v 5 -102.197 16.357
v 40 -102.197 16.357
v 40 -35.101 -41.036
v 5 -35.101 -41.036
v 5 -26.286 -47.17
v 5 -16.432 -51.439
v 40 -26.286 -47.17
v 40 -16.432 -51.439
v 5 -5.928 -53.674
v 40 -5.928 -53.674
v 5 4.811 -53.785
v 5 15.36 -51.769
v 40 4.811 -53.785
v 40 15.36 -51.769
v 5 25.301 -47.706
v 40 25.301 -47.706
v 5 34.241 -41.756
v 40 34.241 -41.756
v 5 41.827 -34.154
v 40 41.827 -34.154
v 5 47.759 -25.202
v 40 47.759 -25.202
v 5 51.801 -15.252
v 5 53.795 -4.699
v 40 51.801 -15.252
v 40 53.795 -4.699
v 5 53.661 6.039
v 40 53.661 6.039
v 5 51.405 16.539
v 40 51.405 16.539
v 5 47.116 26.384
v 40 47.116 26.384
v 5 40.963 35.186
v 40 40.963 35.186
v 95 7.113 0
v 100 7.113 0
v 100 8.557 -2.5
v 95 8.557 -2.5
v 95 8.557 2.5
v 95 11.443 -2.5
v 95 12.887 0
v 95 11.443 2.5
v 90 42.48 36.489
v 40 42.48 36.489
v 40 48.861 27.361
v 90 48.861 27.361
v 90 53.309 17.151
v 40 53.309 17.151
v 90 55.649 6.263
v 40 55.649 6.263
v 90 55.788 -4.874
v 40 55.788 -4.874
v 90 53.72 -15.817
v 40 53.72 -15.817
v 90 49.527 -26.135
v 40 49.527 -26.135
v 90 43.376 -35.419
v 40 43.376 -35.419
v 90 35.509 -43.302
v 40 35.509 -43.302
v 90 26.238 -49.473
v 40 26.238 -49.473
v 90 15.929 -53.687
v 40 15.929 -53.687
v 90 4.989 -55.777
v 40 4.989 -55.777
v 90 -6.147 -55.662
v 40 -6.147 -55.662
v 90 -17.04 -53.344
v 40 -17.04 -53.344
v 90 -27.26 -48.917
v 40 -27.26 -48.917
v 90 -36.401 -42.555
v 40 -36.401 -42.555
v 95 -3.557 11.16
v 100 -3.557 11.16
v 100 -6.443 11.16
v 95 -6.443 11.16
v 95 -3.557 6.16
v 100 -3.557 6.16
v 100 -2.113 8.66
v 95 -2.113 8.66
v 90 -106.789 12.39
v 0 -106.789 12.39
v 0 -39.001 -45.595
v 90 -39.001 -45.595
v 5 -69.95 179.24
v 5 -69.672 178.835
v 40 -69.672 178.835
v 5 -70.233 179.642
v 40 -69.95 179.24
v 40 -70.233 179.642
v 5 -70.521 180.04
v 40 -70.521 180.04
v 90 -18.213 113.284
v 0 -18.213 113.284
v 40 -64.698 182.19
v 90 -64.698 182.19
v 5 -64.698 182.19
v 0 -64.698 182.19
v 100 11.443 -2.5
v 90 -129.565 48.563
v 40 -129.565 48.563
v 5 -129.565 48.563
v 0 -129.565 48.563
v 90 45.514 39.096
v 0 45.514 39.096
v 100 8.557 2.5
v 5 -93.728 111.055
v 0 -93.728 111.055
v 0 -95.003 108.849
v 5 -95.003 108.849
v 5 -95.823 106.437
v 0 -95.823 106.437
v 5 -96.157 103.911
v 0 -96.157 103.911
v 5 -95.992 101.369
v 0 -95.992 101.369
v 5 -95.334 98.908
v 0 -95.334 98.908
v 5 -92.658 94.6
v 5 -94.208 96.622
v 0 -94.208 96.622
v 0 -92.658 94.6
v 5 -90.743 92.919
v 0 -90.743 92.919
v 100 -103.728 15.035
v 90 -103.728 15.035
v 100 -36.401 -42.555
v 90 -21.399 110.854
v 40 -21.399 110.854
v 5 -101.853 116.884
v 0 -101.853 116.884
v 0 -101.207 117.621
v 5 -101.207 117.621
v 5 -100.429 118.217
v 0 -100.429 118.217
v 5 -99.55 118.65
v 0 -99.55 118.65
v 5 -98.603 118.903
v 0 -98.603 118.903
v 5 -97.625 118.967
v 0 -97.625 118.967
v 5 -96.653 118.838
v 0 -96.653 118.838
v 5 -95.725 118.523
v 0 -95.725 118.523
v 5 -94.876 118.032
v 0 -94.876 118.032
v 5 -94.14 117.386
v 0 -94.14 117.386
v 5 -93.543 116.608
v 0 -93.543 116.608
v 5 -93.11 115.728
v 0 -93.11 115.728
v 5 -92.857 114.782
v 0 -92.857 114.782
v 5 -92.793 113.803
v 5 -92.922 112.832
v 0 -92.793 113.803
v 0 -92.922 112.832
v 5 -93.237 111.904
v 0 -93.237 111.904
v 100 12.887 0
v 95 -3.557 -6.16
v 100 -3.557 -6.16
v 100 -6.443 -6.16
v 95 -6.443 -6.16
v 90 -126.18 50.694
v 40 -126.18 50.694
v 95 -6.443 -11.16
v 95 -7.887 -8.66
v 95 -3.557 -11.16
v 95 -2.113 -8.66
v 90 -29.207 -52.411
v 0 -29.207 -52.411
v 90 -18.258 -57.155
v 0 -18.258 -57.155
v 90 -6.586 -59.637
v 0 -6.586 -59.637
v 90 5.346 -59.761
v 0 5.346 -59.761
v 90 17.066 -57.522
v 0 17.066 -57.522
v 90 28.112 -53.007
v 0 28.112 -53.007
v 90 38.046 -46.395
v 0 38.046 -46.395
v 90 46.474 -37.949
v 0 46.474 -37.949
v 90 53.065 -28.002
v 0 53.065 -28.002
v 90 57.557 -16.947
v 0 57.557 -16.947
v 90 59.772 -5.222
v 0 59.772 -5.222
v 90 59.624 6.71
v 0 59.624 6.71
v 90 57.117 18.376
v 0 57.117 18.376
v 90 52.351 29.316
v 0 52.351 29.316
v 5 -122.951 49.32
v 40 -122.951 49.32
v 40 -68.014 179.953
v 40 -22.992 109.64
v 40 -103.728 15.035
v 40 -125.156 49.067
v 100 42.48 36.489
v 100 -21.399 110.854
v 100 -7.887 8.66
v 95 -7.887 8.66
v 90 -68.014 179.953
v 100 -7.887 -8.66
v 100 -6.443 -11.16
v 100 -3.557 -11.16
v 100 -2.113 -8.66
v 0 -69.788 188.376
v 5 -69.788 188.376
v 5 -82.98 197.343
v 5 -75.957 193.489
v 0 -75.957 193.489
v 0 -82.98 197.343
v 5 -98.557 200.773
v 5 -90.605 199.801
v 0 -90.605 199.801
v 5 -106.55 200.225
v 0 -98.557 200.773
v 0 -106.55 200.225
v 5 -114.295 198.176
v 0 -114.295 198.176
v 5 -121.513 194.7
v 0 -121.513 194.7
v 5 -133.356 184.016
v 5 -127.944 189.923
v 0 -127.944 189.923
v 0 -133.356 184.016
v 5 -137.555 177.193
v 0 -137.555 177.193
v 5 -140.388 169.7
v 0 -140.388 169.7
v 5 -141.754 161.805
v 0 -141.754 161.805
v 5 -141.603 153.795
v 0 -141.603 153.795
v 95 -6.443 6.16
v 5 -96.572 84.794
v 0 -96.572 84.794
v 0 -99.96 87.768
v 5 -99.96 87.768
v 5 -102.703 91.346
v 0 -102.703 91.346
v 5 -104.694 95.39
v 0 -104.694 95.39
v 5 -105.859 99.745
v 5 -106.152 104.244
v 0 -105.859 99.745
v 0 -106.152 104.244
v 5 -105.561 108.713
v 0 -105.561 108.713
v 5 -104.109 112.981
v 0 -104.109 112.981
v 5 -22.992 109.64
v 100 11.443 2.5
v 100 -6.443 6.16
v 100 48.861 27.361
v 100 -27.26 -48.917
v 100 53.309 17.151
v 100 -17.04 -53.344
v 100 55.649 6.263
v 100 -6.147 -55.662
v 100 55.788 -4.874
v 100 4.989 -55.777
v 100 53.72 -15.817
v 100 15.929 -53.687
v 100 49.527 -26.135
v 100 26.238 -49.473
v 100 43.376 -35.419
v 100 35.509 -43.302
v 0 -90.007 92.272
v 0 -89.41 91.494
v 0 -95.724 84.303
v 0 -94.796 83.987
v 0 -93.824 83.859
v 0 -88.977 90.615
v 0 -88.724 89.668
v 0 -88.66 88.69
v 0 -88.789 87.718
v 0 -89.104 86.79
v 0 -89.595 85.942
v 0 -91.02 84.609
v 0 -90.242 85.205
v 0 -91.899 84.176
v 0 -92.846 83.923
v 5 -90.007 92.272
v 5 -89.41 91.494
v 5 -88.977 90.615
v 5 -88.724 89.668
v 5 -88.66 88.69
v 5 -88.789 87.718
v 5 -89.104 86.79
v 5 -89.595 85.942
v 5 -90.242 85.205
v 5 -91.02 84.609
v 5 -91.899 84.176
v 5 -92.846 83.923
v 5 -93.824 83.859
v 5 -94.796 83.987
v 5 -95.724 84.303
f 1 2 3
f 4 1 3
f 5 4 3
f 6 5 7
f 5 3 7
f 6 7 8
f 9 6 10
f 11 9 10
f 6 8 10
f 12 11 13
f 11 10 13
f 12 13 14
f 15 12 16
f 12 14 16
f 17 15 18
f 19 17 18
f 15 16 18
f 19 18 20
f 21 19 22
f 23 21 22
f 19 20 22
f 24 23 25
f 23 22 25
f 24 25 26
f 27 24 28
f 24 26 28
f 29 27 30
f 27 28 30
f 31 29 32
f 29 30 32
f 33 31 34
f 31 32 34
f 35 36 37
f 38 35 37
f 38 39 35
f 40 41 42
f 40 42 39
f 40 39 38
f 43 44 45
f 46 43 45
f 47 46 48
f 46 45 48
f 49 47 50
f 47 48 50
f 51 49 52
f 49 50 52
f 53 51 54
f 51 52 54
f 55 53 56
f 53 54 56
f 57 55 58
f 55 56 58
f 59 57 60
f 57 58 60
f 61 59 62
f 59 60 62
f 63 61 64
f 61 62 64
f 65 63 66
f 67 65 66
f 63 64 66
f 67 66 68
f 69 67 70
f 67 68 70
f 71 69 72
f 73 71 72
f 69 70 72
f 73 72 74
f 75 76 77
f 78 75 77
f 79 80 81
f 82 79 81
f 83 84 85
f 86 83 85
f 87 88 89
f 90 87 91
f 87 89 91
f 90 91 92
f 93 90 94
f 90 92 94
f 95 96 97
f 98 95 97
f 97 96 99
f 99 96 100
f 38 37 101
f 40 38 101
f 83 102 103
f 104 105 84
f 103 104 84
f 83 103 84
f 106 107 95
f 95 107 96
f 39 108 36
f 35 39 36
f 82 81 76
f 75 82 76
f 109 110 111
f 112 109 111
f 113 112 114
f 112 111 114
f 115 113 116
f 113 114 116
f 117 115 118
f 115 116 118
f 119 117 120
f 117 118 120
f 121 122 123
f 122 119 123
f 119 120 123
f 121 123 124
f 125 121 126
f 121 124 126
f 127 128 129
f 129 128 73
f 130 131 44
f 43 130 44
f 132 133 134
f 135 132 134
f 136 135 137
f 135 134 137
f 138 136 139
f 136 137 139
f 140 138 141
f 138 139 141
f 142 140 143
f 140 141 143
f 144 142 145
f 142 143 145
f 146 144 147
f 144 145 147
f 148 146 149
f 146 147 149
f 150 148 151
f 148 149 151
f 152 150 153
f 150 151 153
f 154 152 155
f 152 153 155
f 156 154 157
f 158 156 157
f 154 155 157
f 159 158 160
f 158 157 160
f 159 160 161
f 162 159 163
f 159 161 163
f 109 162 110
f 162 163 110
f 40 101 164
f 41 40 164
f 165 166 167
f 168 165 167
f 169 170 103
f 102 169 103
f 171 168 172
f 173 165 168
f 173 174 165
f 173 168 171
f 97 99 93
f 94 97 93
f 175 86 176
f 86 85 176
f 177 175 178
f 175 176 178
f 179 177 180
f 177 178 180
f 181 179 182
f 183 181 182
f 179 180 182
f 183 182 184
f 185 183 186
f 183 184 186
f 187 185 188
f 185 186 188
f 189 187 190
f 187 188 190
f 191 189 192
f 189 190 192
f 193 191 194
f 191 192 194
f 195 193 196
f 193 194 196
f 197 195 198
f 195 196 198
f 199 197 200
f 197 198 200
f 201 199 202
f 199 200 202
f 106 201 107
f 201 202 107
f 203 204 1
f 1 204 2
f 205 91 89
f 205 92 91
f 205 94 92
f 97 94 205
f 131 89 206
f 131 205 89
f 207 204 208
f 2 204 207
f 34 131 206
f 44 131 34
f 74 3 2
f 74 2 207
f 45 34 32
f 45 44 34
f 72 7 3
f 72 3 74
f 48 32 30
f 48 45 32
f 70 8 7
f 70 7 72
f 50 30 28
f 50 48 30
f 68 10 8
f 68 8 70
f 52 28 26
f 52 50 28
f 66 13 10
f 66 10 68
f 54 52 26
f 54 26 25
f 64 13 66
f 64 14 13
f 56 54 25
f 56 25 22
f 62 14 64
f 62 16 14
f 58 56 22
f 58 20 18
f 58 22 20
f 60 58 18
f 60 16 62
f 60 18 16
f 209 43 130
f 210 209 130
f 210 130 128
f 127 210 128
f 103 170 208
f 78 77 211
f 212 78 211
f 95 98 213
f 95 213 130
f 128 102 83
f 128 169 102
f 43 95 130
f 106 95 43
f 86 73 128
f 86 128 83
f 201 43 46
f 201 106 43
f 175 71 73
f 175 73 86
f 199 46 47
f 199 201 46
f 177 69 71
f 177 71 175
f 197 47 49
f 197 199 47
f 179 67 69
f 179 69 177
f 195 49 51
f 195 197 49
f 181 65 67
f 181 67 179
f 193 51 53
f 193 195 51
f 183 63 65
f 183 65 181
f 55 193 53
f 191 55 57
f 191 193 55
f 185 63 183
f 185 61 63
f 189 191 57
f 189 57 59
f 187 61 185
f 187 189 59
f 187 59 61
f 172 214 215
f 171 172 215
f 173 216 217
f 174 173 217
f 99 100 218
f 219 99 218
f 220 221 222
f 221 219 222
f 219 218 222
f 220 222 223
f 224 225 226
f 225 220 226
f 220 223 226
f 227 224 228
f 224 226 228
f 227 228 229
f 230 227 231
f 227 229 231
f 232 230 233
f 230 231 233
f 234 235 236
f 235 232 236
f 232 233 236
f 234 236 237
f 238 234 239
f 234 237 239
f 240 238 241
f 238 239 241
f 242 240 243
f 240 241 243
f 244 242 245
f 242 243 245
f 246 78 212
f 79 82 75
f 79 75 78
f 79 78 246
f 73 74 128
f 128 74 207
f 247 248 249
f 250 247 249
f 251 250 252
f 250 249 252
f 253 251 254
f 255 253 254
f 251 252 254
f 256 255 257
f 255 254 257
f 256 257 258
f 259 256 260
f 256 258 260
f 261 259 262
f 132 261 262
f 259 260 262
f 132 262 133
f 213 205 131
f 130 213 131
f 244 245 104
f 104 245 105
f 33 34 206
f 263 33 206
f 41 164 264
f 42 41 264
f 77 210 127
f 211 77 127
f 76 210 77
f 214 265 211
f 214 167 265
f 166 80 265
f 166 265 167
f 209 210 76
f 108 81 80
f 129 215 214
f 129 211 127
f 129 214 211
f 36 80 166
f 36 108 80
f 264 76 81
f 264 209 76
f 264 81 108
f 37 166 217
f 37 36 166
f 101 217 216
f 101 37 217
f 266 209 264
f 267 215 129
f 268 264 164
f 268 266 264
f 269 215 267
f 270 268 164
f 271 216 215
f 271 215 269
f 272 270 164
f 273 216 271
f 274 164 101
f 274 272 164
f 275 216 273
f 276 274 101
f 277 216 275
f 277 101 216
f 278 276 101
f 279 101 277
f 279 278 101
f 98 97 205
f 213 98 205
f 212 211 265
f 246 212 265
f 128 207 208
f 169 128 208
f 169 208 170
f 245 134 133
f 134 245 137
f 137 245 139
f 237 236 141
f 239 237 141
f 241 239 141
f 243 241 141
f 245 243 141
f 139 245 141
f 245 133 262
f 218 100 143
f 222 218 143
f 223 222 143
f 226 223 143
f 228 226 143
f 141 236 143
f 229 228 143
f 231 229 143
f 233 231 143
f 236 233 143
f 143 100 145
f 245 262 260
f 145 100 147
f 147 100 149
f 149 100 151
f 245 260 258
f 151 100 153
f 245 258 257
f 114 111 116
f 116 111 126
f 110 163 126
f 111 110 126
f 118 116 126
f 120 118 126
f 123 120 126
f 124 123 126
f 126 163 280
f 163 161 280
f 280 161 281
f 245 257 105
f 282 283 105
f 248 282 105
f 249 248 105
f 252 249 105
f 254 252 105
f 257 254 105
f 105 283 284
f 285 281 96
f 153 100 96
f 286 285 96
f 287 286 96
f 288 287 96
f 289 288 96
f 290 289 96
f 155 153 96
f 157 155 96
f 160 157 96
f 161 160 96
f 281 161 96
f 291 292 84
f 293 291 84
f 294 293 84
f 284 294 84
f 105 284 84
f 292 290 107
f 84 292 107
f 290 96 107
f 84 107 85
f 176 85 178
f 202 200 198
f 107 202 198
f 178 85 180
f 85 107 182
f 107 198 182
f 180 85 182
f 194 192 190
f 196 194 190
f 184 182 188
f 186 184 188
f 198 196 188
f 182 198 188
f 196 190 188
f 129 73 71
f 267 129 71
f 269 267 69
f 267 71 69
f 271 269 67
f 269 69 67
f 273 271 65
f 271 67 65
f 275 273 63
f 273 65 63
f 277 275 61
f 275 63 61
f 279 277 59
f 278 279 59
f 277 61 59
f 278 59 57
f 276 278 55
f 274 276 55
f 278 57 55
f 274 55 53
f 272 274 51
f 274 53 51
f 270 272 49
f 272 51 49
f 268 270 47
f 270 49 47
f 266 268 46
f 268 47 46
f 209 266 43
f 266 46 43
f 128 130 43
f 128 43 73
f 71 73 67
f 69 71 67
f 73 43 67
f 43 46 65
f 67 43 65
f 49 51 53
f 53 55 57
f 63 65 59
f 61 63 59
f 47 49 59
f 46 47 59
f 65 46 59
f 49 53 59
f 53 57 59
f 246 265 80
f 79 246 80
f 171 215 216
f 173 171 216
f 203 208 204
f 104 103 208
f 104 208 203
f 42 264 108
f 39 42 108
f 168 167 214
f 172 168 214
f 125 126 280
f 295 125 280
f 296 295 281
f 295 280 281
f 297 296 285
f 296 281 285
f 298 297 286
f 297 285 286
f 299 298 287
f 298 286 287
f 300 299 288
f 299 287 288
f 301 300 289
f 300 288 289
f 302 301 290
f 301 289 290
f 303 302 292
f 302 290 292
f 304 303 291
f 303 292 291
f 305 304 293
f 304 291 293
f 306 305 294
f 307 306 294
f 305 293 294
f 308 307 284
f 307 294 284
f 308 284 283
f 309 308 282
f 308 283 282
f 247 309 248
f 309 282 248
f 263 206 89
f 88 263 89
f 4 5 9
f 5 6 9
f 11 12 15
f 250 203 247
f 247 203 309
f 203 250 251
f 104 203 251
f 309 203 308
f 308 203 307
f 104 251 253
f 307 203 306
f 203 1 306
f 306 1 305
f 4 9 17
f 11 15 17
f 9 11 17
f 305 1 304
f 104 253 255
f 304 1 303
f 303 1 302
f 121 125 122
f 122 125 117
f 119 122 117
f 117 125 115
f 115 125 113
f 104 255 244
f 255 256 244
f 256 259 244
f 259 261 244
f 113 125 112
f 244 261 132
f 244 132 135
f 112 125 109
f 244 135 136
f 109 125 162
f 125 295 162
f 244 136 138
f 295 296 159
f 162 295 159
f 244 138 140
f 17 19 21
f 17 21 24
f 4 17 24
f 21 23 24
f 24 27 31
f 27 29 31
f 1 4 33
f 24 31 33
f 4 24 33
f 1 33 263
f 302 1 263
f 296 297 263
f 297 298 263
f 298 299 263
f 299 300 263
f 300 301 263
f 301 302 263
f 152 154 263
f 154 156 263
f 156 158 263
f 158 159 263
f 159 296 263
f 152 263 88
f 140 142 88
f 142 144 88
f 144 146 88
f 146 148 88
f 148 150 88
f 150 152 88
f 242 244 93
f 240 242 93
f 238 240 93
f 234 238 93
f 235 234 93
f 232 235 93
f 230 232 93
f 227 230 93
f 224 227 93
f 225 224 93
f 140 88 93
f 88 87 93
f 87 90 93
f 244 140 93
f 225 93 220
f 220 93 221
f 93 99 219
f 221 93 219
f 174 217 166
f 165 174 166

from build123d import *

# Parameters (mm, degrees)
EXTRUDE_1_DEPTH      = 40
CUT_EXTRUDE_4_DEPTH  = 35
SKETCH_7_W           = 35
SKETCH_7_H           = 105.918756423
CUT_EXTRUDE_5_DEPTH  = 15
CUT_EXTRUDE_START    = -35
CUT_EXTRUDE_9_DEPTH  = 35
CUT_EXTRUDE_10_DEPTH = 35
CUT_EXTRUDE_11_DEPTH = 10
EXTRUDE_1_2_DEPTH    = 50
EXTRUDE_2_DEPTH      = 10
CUT_EXTRUDE_12_DEPTH = 5


with BuildPart() as part:
    # 草图3 → Extrude 1 (new body)
    with BuildSketch(Plane(origin=(0, 0, 0), x_dir=(0, 0, -1), z_dir=(1, 0, 0))):
        with BuildLine():
            Line((-39.095806766, 45.513930761), (-113.284374472, -18.21297348))
            Line((-113.284374472, -18.21297348), (-182.19003676, -64.697864694))
            ThreePointArc((-182.19003676, -64.697864694), (-198.176247728, -114.294556788), (-153.795474112, -141.602755941))
            Line((-153.795474112, -141.602755941), (-48.562971232, -129.565177285))
            Line((-48.562971232, -129.565177285), (-12.389530407, -106.789307136))
            Line((-12.389530407, -106.789307136), (45.595100093, -39.001113414))
            ThreePointArc((45.595100093, -39.001113414), (42.382288475, 42.470479437), (-39.095806766, 45.513930761))
        make_face()
    extrude(amount=EXTRUDE_1_DEPTH)

    # 草图6 → 切除-拉伸4 (cut)
    with BuildSketch(Plane(origin=(40, 0, 0), x_dir=(0, 0, -1), z_dir=(1, 0, 0))):
        with BuildLine():
            Line((-35.186226089, 40.962537685), (-109.639530952, -22.991771937))
            Line((-109.639530952, -22.991771937), (-178.834510467, -69.671841302))
            ThreePointArc((-178.834510467, -69.671841302), (-192.547642974, -112.216382465), (-154.477369126, -135.641630276))
            Line((-154.477369126, -135.641630276), (-50.603031616, -123.759412579))
            Line((-50.603031616, -123.759412579), (-16.357071017, -102.19714109))
            Line((-16.357071017, -102.19714109), (41.035590084, -35.101002072))
            ThreePointArc((41.035590084, -35.101002072), (38.144059628, 38.223431493), (-35.186226089, 40.962537685))
        make_face()
    extrude(amount=-CUT_EXTRUDE_4_DEPTH, mode=Mode.SUBTRACT)

    # 草图7 → 切除-拉伸5 (cut)
    with BuildSketch(Plane(origin=(0, -122.40831364, -14.002324977), x_dir=(-1, 0, 0), z_dir=(0, -0.9935209441032395, -0.11364916906078788))):
        with Locations((-22.5, -115.932681977)):
            Rectangle(SKETCH_7_W, SKETCH_7_H)
    extrude(amount=-CUT_EXTRUDE_5_DEPTH, mode=Mode.SUBTRACT)

    # 草图10 → 切除-拉伸9 (cut)
    with BuildSketch(Plane(origin=(40, 0, 0), x_dir=(0, 0, -1), z_dir=(1, 0, 0)).offset(CUT_EXTRUDE_START)):
        with BuildLine():
            Line((-182.19003676, -64.697864694), (-153.795474112, -141.602755941))
            ThreePointArc((-153.795474112, -141.602755941), (-198.176247728, -114.294556788), (-182.19003676, -64.697864694))
        make_face()
    extrude(amount=CUT_EXTRUDE_9_DEPTH, mode=Mode.SUBTRACT)

    # 草图11 → 切除-拉伸10 (cut)
    with BuildSketch(Plane(origin=(40, 0, 0), x_dir=(0, 0, -1), z_dir=(1, 0, 0))):
        with BuildLine():
            Line((-153.795474112, -141.602755941), (-155.945574258, -135.779344608))
            ThreePointArc((-155.945574258, -135.779344608), (-155.210770318, -135.717964955), (-154.477369126, -135.641630276))
            Line((-154.477369126, -135.641630276), (-153.795474112, -141.602755941))
        make_face()
    extrude(amount=-CUT_EXTRUDE_10_DEPTH, mode=Mode.SUBTRACT)

    # 草图12 → 切除-拉伸11 (cut)
    with BuildSketch(Plane.ZY):
        with BuildLine():
            ThreePointArc((84.793520473, -96.572189119), (99.745010507, -105.858971316), (116.884057166, -101.853417992))
            ThreePointArc((116.884057166, -101.853417992), (118.032316505, -94.876205046), (111.055103559, -93.727945707))
            ThreePointArc((111.055103559, -93.727945707), (101.368894437, -95.991702141), (92.918992758, -90.743235512))
            ThreePointArc((92.918992758, -90.743235512), (85.941779812, -89.594976173), (84.793520473, -96.572189119))
        make_face()
    extrude(amount=-CUT_EXTRUDE_11_DEPTH, mode=Mode.SUBTRACT)

    # 草图14 → Extrude 1 2 (add)
    with BuildSketch(Plane(origin=(40, 0, 0), x_dir=(0, 0, -1), z_dir=(1, 0, 0))):
        with BuildLine():
            Line((-49.319536319, -122.95128591), (-16.357071017, -102.19714109))
            Line((-16.357071017, -102.19714109), (41.035590084, -35.101002072))
            ThreePointArc((41.035590084, -35.101002072), (38.144059628, 38.223431493), (-35.186226089, 40.962537685))
            Line((-35.186226089, 40.962537685), (-109.639530952, -22.991771937))
            Line((-109.639530952, -22.991771937), (-178.834510467, -69.671841302))
            Line((-178.834510467, -69.671841302), (-176.597492938, -72.987825708))
            Line((-176.597492938, -72.987825708), (-107.209635272, -26.177637574))
            Line((-107.209635272, -26.177637574), (-32.579838971, 37.928275634))
            ThreePointArc((-32.579838971, 37.928275634), (35.31857373, 35.392066197), (37.995916744, -32.500927845))
            Line((37.995916744, -32.500927845), (-19.00209809, -99.13569706))
            Line((-19.00209809, -99.13569706), (-51.450789398, -119.56635455))
            Line((-51.450789398, -119.56635455), (-49.319536319, -122.95128591))
        make_face()
        with BuildLine():
            Line((-48.562971232, -129.565177285), (-12.389530407, -106.789307136))
            Line((-12.389530407, -106.789307136), (45.595100093, -39.001113414))
            ThreePointArc((45.595100093, -39.001113414), (42.382288475, 42.470479437), (-39.095806766, 45.513930761))
            Line((-39.095806766, 45.513930761), (-113.284374472, -18.21297348))
            Line((-113.284374472, -18.21297348), (-182.19003676, -64.697864694))
            Line((-182.19003676, -64.697864694), (-179.953019231, -68.0138491))
            Line((-179.953019231, -68.0138491), (-110.854478792, -21.398839118))
            Line((-110.854478792, -21.398839118), (-36.489419648, 42.47966871))
            ThreePointArc((-36.489419648, 42.47966871), (39.556802577, 39.639114141), (42.555426753, -36.401039186))
            Line((42.555426753, -36.401039186), (-15.03455748, -103.727863106))
            Line((-15.03455748, -103.727863106), (-50.694224311, -126.180245925))
            Line((-50.694224311, -126.180245925), (-48.562971232, -129.565177285))
        make_face()
    extrude(amount=EXTRUDE_1_2_DEPTH)


with BuildPart() as extrude_1_2_kept_piece:
    # of the separate pieces the step leaves, the one the design keeps (extrude_1_2_pieces_kept)
    add(part.part.solids().sort_by_distance((90, 45.513930761, 39.095806766))[0])


with BuildPart() as body_2:
    # 草图15 → 凸台-拉伸2 (new body)
    with BuildSketch(Plane(origin=(90, 0, 0), x_dir=(0, 0, -1), z_dir=(1, 0, 0))):
        with BuildLine():
            Line((-15.03455748, -103.727863106), (42.555426753, -36.401039186))
            ThreePointArc((42.555426753, -36.401039186), (39.556802577, 39.639114141), (-36.489419648, 42.47966871))
            Line((-36.489419648, 42.47966871), (-110.854478792, -21.398839118))
            Line((-110.854478792, -21.398839118), (-15.03455748, -103.727863106))
        make_face()
    extrude(amount=EXTRUDE_2_DEPTH)

    # 草图16 → 切除-拉伸12 (cut)
    with BuildSketch(Plane(origin=(100, 0, 0), x_dir=(0, 0, -1), z_dir=(1, 0, 0))):
        Polygon((6.160254038, -3.556624327), (6.160254038, -6.443375673), (8.660254038, -7.886751346), (11.160254038, -6.443375673), (11.160254038, -3.556624327), (8.660254038, -2.113248654), align=None)
        Polygon((0, 7.113248654), (2.5, 8.556624327), (2.5, 11.443375673), (0, 12.886751346), (-2.5, 11.443375673), (-2.5, 8.556624327), align=None)
        Polygon((-6.160254038, -3.556624327), (-8.660254038, -2.113248654), (-11.160254038, -3.556624327), (-11.160254038, -6.443375673), (-8.660254038, -7.886751346), (-6.160254038, -6.443375673), align=None)
    extrude(amount=-CUT_EXTRUDE_12_DEPTH, mode=Mode.SUBTRACT)


solid = Compound([extrude_1_2_kept_piece.part, body_2.part])
